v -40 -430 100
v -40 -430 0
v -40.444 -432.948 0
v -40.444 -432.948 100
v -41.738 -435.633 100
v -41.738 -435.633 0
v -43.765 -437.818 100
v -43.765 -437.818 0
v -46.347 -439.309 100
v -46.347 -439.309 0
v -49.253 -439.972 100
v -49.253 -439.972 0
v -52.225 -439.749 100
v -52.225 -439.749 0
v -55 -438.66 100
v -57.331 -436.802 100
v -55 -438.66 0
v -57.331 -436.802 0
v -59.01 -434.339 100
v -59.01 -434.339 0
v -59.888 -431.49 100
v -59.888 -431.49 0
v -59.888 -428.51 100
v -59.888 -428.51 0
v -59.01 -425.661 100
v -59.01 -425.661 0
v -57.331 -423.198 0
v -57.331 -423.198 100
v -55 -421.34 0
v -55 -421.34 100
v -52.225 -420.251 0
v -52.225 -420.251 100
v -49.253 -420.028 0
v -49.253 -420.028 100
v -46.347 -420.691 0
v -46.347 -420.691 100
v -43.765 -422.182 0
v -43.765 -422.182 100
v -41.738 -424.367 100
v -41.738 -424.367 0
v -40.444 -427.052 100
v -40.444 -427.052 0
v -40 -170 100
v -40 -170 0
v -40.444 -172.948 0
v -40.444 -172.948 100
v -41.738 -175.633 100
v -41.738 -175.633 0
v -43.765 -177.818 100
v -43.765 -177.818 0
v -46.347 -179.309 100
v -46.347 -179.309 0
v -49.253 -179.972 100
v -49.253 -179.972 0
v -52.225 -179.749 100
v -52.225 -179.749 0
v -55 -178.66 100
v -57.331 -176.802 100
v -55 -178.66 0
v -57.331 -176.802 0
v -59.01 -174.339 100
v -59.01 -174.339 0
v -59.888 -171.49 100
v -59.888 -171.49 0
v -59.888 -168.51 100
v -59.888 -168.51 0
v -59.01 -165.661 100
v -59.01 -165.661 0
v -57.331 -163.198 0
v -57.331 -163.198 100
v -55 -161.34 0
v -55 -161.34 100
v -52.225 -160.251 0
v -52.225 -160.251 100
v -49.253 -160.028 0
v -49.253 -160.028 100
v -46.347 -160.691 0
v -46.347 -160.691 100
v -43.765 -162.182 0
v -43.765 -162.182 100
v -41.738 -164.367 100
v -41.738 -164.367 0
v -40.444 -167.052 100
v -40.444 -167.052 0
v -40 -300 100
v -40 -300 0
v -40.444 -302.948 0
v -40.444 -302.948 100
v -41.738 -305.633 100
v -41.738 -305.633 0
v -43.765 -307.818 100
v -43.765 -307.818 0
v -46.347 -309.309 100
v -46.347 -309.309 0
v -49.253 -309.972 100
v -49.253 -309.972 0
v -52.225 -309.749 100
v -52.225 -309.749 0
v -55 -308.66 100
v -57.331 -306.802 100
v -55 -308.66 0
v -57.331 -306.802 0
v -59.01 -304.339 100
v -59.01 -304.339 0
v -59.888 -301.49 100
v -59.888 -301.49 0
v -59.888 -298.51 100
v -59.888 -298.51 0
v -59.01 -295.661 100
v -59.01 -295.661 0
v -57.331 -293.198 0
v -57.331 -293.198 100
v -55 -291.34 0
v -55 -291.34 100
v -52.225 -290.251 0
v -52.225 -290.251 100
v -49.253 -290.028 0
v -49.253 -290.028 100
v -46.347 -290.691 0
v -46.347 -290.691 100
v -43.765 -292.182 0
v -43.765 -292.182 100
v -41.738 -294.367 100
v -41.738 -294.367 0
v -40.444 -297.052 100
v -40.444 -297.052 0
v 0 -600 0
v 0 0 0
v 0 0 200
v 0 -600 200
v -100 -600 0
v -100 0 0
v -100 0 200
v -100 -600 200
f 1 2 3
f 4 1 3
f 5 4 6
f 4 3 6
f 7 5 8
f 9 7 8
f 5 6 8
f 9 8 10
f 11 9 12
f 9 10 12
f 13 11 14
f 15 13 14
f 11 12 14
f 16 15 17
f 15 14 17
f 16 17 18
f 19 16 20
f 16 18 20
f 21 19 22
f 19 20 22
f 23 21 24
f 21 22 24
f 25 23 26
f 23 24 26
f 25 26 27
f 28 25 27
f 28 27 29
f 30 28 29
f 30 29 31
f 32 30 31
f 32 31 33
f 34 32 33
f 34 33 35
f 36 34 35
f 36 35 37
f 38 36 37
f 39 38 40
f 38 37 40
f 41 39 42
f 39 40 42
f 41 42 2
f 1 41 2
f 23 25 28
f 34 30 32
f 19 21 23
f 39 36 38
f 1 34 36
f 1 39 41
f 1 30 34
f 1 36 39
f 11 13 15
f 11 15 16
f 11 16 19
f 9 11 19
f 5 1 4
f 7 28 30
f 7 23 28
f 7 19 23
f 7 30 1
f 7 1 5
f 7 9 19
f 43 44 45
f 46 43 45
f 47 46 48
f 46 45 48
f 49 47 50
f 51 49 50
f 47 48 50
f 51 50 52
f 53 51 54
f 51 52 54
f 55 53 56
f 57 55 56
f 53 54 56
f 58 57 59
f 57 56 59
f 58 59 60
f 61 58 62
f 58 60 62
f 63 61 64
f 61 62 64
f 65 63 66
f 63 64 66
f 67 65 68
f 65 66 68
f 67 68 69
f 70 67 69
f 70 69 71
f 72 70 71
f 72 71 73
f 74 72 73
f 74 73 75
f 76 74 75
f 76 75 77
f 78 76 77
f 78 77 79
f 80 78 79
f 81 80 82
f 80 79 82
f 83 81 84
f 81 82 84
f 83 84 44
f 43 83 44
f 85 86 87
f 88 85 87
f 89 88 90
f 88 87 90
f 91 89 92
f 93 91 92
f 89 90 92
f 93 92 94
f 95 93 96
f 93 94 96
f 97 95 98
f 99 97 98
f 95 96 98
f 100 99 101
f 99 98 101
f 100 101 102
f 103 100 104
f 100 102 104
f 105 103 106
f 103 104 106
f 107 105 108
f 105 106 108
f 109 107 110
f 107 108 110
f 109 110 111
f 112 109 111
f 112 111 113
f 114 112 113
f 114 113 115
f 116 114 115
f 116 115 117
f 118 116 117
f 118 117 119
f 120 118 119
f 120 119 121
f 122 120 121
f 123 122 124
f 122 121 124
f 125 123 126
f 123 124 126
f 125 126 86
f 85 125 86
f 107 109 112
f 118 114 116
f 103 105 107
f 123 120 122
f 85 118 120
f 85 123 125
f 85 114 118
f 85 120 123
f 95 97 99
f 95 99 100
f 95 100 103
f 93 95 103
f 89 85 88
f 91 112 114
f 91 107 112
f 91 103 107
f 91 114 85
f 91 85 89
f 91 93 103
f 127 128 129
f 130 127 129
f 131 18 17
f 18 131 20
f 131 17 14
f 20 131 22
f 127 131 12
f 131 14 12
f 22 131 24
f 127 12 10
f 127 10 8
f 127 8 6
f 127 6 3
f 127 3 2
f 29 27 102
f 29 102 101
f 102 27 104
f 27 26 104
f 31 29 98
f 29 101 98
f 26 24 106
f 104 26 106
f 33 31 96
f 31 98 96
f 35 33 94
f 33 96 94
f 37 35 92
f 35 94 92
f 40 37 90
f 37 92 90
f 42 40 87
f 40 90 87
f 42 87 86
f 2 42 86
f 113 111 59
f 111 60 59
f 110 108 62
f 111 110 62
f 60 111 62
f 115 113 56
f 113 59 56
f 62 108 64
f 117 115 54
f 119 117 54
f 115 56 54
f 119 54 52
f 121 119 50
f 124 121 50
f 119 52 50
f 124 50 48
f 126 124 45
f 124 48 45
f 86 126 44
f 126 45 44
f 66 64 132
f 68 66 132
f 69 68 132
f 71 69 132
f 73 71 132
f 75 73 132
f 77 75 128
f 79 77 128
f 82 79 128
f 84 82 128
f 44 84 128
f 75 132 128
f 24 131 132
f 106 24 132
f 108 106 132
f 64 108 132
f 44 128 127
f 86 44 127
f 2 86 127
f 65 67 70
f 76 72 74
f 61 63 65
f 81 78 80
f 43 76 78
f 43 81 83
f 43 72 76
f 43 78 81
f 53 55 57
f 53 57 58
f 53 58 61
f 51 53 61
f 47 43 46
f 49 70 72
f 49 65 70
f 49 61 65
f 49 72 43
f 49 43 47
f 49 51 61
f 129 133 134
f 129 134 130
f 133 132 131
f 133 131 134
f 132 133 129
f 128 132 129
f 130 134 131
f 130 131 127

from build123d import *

# Parameters (mm, degrees)
F0_W     = 100
F0_H     = 200
F1_DEPTH = 600
F2_R     = 10
F3_DEPTH = 100


with BuildPart() as f1:
    # F0 (on Front) → F1 (new body)
    with BuildSketch(Plane.XZ):
        with Locations((-50, 100)):
            Rectangle(F0_W, F0_H)
    extrude(amount=F1_DEPTH)

    # F2 (on face) → F3 (cut)
    with BuildSketch(Plane(origin=(0, 0, 0), x_dir=(1, 0, 0), z_dir=(0, 0, -1))):
        with Locations((-50, 430)):
            Circle(F2_R)
        with Locations((-50, 170)):
            Circle(F2_R)
        with Locations((-50, 300)):
            Circle(F2_R)
    extrude(amount=-F3_DEPTH, mode=Mode.SUBTRACT)


solid = f1.part
